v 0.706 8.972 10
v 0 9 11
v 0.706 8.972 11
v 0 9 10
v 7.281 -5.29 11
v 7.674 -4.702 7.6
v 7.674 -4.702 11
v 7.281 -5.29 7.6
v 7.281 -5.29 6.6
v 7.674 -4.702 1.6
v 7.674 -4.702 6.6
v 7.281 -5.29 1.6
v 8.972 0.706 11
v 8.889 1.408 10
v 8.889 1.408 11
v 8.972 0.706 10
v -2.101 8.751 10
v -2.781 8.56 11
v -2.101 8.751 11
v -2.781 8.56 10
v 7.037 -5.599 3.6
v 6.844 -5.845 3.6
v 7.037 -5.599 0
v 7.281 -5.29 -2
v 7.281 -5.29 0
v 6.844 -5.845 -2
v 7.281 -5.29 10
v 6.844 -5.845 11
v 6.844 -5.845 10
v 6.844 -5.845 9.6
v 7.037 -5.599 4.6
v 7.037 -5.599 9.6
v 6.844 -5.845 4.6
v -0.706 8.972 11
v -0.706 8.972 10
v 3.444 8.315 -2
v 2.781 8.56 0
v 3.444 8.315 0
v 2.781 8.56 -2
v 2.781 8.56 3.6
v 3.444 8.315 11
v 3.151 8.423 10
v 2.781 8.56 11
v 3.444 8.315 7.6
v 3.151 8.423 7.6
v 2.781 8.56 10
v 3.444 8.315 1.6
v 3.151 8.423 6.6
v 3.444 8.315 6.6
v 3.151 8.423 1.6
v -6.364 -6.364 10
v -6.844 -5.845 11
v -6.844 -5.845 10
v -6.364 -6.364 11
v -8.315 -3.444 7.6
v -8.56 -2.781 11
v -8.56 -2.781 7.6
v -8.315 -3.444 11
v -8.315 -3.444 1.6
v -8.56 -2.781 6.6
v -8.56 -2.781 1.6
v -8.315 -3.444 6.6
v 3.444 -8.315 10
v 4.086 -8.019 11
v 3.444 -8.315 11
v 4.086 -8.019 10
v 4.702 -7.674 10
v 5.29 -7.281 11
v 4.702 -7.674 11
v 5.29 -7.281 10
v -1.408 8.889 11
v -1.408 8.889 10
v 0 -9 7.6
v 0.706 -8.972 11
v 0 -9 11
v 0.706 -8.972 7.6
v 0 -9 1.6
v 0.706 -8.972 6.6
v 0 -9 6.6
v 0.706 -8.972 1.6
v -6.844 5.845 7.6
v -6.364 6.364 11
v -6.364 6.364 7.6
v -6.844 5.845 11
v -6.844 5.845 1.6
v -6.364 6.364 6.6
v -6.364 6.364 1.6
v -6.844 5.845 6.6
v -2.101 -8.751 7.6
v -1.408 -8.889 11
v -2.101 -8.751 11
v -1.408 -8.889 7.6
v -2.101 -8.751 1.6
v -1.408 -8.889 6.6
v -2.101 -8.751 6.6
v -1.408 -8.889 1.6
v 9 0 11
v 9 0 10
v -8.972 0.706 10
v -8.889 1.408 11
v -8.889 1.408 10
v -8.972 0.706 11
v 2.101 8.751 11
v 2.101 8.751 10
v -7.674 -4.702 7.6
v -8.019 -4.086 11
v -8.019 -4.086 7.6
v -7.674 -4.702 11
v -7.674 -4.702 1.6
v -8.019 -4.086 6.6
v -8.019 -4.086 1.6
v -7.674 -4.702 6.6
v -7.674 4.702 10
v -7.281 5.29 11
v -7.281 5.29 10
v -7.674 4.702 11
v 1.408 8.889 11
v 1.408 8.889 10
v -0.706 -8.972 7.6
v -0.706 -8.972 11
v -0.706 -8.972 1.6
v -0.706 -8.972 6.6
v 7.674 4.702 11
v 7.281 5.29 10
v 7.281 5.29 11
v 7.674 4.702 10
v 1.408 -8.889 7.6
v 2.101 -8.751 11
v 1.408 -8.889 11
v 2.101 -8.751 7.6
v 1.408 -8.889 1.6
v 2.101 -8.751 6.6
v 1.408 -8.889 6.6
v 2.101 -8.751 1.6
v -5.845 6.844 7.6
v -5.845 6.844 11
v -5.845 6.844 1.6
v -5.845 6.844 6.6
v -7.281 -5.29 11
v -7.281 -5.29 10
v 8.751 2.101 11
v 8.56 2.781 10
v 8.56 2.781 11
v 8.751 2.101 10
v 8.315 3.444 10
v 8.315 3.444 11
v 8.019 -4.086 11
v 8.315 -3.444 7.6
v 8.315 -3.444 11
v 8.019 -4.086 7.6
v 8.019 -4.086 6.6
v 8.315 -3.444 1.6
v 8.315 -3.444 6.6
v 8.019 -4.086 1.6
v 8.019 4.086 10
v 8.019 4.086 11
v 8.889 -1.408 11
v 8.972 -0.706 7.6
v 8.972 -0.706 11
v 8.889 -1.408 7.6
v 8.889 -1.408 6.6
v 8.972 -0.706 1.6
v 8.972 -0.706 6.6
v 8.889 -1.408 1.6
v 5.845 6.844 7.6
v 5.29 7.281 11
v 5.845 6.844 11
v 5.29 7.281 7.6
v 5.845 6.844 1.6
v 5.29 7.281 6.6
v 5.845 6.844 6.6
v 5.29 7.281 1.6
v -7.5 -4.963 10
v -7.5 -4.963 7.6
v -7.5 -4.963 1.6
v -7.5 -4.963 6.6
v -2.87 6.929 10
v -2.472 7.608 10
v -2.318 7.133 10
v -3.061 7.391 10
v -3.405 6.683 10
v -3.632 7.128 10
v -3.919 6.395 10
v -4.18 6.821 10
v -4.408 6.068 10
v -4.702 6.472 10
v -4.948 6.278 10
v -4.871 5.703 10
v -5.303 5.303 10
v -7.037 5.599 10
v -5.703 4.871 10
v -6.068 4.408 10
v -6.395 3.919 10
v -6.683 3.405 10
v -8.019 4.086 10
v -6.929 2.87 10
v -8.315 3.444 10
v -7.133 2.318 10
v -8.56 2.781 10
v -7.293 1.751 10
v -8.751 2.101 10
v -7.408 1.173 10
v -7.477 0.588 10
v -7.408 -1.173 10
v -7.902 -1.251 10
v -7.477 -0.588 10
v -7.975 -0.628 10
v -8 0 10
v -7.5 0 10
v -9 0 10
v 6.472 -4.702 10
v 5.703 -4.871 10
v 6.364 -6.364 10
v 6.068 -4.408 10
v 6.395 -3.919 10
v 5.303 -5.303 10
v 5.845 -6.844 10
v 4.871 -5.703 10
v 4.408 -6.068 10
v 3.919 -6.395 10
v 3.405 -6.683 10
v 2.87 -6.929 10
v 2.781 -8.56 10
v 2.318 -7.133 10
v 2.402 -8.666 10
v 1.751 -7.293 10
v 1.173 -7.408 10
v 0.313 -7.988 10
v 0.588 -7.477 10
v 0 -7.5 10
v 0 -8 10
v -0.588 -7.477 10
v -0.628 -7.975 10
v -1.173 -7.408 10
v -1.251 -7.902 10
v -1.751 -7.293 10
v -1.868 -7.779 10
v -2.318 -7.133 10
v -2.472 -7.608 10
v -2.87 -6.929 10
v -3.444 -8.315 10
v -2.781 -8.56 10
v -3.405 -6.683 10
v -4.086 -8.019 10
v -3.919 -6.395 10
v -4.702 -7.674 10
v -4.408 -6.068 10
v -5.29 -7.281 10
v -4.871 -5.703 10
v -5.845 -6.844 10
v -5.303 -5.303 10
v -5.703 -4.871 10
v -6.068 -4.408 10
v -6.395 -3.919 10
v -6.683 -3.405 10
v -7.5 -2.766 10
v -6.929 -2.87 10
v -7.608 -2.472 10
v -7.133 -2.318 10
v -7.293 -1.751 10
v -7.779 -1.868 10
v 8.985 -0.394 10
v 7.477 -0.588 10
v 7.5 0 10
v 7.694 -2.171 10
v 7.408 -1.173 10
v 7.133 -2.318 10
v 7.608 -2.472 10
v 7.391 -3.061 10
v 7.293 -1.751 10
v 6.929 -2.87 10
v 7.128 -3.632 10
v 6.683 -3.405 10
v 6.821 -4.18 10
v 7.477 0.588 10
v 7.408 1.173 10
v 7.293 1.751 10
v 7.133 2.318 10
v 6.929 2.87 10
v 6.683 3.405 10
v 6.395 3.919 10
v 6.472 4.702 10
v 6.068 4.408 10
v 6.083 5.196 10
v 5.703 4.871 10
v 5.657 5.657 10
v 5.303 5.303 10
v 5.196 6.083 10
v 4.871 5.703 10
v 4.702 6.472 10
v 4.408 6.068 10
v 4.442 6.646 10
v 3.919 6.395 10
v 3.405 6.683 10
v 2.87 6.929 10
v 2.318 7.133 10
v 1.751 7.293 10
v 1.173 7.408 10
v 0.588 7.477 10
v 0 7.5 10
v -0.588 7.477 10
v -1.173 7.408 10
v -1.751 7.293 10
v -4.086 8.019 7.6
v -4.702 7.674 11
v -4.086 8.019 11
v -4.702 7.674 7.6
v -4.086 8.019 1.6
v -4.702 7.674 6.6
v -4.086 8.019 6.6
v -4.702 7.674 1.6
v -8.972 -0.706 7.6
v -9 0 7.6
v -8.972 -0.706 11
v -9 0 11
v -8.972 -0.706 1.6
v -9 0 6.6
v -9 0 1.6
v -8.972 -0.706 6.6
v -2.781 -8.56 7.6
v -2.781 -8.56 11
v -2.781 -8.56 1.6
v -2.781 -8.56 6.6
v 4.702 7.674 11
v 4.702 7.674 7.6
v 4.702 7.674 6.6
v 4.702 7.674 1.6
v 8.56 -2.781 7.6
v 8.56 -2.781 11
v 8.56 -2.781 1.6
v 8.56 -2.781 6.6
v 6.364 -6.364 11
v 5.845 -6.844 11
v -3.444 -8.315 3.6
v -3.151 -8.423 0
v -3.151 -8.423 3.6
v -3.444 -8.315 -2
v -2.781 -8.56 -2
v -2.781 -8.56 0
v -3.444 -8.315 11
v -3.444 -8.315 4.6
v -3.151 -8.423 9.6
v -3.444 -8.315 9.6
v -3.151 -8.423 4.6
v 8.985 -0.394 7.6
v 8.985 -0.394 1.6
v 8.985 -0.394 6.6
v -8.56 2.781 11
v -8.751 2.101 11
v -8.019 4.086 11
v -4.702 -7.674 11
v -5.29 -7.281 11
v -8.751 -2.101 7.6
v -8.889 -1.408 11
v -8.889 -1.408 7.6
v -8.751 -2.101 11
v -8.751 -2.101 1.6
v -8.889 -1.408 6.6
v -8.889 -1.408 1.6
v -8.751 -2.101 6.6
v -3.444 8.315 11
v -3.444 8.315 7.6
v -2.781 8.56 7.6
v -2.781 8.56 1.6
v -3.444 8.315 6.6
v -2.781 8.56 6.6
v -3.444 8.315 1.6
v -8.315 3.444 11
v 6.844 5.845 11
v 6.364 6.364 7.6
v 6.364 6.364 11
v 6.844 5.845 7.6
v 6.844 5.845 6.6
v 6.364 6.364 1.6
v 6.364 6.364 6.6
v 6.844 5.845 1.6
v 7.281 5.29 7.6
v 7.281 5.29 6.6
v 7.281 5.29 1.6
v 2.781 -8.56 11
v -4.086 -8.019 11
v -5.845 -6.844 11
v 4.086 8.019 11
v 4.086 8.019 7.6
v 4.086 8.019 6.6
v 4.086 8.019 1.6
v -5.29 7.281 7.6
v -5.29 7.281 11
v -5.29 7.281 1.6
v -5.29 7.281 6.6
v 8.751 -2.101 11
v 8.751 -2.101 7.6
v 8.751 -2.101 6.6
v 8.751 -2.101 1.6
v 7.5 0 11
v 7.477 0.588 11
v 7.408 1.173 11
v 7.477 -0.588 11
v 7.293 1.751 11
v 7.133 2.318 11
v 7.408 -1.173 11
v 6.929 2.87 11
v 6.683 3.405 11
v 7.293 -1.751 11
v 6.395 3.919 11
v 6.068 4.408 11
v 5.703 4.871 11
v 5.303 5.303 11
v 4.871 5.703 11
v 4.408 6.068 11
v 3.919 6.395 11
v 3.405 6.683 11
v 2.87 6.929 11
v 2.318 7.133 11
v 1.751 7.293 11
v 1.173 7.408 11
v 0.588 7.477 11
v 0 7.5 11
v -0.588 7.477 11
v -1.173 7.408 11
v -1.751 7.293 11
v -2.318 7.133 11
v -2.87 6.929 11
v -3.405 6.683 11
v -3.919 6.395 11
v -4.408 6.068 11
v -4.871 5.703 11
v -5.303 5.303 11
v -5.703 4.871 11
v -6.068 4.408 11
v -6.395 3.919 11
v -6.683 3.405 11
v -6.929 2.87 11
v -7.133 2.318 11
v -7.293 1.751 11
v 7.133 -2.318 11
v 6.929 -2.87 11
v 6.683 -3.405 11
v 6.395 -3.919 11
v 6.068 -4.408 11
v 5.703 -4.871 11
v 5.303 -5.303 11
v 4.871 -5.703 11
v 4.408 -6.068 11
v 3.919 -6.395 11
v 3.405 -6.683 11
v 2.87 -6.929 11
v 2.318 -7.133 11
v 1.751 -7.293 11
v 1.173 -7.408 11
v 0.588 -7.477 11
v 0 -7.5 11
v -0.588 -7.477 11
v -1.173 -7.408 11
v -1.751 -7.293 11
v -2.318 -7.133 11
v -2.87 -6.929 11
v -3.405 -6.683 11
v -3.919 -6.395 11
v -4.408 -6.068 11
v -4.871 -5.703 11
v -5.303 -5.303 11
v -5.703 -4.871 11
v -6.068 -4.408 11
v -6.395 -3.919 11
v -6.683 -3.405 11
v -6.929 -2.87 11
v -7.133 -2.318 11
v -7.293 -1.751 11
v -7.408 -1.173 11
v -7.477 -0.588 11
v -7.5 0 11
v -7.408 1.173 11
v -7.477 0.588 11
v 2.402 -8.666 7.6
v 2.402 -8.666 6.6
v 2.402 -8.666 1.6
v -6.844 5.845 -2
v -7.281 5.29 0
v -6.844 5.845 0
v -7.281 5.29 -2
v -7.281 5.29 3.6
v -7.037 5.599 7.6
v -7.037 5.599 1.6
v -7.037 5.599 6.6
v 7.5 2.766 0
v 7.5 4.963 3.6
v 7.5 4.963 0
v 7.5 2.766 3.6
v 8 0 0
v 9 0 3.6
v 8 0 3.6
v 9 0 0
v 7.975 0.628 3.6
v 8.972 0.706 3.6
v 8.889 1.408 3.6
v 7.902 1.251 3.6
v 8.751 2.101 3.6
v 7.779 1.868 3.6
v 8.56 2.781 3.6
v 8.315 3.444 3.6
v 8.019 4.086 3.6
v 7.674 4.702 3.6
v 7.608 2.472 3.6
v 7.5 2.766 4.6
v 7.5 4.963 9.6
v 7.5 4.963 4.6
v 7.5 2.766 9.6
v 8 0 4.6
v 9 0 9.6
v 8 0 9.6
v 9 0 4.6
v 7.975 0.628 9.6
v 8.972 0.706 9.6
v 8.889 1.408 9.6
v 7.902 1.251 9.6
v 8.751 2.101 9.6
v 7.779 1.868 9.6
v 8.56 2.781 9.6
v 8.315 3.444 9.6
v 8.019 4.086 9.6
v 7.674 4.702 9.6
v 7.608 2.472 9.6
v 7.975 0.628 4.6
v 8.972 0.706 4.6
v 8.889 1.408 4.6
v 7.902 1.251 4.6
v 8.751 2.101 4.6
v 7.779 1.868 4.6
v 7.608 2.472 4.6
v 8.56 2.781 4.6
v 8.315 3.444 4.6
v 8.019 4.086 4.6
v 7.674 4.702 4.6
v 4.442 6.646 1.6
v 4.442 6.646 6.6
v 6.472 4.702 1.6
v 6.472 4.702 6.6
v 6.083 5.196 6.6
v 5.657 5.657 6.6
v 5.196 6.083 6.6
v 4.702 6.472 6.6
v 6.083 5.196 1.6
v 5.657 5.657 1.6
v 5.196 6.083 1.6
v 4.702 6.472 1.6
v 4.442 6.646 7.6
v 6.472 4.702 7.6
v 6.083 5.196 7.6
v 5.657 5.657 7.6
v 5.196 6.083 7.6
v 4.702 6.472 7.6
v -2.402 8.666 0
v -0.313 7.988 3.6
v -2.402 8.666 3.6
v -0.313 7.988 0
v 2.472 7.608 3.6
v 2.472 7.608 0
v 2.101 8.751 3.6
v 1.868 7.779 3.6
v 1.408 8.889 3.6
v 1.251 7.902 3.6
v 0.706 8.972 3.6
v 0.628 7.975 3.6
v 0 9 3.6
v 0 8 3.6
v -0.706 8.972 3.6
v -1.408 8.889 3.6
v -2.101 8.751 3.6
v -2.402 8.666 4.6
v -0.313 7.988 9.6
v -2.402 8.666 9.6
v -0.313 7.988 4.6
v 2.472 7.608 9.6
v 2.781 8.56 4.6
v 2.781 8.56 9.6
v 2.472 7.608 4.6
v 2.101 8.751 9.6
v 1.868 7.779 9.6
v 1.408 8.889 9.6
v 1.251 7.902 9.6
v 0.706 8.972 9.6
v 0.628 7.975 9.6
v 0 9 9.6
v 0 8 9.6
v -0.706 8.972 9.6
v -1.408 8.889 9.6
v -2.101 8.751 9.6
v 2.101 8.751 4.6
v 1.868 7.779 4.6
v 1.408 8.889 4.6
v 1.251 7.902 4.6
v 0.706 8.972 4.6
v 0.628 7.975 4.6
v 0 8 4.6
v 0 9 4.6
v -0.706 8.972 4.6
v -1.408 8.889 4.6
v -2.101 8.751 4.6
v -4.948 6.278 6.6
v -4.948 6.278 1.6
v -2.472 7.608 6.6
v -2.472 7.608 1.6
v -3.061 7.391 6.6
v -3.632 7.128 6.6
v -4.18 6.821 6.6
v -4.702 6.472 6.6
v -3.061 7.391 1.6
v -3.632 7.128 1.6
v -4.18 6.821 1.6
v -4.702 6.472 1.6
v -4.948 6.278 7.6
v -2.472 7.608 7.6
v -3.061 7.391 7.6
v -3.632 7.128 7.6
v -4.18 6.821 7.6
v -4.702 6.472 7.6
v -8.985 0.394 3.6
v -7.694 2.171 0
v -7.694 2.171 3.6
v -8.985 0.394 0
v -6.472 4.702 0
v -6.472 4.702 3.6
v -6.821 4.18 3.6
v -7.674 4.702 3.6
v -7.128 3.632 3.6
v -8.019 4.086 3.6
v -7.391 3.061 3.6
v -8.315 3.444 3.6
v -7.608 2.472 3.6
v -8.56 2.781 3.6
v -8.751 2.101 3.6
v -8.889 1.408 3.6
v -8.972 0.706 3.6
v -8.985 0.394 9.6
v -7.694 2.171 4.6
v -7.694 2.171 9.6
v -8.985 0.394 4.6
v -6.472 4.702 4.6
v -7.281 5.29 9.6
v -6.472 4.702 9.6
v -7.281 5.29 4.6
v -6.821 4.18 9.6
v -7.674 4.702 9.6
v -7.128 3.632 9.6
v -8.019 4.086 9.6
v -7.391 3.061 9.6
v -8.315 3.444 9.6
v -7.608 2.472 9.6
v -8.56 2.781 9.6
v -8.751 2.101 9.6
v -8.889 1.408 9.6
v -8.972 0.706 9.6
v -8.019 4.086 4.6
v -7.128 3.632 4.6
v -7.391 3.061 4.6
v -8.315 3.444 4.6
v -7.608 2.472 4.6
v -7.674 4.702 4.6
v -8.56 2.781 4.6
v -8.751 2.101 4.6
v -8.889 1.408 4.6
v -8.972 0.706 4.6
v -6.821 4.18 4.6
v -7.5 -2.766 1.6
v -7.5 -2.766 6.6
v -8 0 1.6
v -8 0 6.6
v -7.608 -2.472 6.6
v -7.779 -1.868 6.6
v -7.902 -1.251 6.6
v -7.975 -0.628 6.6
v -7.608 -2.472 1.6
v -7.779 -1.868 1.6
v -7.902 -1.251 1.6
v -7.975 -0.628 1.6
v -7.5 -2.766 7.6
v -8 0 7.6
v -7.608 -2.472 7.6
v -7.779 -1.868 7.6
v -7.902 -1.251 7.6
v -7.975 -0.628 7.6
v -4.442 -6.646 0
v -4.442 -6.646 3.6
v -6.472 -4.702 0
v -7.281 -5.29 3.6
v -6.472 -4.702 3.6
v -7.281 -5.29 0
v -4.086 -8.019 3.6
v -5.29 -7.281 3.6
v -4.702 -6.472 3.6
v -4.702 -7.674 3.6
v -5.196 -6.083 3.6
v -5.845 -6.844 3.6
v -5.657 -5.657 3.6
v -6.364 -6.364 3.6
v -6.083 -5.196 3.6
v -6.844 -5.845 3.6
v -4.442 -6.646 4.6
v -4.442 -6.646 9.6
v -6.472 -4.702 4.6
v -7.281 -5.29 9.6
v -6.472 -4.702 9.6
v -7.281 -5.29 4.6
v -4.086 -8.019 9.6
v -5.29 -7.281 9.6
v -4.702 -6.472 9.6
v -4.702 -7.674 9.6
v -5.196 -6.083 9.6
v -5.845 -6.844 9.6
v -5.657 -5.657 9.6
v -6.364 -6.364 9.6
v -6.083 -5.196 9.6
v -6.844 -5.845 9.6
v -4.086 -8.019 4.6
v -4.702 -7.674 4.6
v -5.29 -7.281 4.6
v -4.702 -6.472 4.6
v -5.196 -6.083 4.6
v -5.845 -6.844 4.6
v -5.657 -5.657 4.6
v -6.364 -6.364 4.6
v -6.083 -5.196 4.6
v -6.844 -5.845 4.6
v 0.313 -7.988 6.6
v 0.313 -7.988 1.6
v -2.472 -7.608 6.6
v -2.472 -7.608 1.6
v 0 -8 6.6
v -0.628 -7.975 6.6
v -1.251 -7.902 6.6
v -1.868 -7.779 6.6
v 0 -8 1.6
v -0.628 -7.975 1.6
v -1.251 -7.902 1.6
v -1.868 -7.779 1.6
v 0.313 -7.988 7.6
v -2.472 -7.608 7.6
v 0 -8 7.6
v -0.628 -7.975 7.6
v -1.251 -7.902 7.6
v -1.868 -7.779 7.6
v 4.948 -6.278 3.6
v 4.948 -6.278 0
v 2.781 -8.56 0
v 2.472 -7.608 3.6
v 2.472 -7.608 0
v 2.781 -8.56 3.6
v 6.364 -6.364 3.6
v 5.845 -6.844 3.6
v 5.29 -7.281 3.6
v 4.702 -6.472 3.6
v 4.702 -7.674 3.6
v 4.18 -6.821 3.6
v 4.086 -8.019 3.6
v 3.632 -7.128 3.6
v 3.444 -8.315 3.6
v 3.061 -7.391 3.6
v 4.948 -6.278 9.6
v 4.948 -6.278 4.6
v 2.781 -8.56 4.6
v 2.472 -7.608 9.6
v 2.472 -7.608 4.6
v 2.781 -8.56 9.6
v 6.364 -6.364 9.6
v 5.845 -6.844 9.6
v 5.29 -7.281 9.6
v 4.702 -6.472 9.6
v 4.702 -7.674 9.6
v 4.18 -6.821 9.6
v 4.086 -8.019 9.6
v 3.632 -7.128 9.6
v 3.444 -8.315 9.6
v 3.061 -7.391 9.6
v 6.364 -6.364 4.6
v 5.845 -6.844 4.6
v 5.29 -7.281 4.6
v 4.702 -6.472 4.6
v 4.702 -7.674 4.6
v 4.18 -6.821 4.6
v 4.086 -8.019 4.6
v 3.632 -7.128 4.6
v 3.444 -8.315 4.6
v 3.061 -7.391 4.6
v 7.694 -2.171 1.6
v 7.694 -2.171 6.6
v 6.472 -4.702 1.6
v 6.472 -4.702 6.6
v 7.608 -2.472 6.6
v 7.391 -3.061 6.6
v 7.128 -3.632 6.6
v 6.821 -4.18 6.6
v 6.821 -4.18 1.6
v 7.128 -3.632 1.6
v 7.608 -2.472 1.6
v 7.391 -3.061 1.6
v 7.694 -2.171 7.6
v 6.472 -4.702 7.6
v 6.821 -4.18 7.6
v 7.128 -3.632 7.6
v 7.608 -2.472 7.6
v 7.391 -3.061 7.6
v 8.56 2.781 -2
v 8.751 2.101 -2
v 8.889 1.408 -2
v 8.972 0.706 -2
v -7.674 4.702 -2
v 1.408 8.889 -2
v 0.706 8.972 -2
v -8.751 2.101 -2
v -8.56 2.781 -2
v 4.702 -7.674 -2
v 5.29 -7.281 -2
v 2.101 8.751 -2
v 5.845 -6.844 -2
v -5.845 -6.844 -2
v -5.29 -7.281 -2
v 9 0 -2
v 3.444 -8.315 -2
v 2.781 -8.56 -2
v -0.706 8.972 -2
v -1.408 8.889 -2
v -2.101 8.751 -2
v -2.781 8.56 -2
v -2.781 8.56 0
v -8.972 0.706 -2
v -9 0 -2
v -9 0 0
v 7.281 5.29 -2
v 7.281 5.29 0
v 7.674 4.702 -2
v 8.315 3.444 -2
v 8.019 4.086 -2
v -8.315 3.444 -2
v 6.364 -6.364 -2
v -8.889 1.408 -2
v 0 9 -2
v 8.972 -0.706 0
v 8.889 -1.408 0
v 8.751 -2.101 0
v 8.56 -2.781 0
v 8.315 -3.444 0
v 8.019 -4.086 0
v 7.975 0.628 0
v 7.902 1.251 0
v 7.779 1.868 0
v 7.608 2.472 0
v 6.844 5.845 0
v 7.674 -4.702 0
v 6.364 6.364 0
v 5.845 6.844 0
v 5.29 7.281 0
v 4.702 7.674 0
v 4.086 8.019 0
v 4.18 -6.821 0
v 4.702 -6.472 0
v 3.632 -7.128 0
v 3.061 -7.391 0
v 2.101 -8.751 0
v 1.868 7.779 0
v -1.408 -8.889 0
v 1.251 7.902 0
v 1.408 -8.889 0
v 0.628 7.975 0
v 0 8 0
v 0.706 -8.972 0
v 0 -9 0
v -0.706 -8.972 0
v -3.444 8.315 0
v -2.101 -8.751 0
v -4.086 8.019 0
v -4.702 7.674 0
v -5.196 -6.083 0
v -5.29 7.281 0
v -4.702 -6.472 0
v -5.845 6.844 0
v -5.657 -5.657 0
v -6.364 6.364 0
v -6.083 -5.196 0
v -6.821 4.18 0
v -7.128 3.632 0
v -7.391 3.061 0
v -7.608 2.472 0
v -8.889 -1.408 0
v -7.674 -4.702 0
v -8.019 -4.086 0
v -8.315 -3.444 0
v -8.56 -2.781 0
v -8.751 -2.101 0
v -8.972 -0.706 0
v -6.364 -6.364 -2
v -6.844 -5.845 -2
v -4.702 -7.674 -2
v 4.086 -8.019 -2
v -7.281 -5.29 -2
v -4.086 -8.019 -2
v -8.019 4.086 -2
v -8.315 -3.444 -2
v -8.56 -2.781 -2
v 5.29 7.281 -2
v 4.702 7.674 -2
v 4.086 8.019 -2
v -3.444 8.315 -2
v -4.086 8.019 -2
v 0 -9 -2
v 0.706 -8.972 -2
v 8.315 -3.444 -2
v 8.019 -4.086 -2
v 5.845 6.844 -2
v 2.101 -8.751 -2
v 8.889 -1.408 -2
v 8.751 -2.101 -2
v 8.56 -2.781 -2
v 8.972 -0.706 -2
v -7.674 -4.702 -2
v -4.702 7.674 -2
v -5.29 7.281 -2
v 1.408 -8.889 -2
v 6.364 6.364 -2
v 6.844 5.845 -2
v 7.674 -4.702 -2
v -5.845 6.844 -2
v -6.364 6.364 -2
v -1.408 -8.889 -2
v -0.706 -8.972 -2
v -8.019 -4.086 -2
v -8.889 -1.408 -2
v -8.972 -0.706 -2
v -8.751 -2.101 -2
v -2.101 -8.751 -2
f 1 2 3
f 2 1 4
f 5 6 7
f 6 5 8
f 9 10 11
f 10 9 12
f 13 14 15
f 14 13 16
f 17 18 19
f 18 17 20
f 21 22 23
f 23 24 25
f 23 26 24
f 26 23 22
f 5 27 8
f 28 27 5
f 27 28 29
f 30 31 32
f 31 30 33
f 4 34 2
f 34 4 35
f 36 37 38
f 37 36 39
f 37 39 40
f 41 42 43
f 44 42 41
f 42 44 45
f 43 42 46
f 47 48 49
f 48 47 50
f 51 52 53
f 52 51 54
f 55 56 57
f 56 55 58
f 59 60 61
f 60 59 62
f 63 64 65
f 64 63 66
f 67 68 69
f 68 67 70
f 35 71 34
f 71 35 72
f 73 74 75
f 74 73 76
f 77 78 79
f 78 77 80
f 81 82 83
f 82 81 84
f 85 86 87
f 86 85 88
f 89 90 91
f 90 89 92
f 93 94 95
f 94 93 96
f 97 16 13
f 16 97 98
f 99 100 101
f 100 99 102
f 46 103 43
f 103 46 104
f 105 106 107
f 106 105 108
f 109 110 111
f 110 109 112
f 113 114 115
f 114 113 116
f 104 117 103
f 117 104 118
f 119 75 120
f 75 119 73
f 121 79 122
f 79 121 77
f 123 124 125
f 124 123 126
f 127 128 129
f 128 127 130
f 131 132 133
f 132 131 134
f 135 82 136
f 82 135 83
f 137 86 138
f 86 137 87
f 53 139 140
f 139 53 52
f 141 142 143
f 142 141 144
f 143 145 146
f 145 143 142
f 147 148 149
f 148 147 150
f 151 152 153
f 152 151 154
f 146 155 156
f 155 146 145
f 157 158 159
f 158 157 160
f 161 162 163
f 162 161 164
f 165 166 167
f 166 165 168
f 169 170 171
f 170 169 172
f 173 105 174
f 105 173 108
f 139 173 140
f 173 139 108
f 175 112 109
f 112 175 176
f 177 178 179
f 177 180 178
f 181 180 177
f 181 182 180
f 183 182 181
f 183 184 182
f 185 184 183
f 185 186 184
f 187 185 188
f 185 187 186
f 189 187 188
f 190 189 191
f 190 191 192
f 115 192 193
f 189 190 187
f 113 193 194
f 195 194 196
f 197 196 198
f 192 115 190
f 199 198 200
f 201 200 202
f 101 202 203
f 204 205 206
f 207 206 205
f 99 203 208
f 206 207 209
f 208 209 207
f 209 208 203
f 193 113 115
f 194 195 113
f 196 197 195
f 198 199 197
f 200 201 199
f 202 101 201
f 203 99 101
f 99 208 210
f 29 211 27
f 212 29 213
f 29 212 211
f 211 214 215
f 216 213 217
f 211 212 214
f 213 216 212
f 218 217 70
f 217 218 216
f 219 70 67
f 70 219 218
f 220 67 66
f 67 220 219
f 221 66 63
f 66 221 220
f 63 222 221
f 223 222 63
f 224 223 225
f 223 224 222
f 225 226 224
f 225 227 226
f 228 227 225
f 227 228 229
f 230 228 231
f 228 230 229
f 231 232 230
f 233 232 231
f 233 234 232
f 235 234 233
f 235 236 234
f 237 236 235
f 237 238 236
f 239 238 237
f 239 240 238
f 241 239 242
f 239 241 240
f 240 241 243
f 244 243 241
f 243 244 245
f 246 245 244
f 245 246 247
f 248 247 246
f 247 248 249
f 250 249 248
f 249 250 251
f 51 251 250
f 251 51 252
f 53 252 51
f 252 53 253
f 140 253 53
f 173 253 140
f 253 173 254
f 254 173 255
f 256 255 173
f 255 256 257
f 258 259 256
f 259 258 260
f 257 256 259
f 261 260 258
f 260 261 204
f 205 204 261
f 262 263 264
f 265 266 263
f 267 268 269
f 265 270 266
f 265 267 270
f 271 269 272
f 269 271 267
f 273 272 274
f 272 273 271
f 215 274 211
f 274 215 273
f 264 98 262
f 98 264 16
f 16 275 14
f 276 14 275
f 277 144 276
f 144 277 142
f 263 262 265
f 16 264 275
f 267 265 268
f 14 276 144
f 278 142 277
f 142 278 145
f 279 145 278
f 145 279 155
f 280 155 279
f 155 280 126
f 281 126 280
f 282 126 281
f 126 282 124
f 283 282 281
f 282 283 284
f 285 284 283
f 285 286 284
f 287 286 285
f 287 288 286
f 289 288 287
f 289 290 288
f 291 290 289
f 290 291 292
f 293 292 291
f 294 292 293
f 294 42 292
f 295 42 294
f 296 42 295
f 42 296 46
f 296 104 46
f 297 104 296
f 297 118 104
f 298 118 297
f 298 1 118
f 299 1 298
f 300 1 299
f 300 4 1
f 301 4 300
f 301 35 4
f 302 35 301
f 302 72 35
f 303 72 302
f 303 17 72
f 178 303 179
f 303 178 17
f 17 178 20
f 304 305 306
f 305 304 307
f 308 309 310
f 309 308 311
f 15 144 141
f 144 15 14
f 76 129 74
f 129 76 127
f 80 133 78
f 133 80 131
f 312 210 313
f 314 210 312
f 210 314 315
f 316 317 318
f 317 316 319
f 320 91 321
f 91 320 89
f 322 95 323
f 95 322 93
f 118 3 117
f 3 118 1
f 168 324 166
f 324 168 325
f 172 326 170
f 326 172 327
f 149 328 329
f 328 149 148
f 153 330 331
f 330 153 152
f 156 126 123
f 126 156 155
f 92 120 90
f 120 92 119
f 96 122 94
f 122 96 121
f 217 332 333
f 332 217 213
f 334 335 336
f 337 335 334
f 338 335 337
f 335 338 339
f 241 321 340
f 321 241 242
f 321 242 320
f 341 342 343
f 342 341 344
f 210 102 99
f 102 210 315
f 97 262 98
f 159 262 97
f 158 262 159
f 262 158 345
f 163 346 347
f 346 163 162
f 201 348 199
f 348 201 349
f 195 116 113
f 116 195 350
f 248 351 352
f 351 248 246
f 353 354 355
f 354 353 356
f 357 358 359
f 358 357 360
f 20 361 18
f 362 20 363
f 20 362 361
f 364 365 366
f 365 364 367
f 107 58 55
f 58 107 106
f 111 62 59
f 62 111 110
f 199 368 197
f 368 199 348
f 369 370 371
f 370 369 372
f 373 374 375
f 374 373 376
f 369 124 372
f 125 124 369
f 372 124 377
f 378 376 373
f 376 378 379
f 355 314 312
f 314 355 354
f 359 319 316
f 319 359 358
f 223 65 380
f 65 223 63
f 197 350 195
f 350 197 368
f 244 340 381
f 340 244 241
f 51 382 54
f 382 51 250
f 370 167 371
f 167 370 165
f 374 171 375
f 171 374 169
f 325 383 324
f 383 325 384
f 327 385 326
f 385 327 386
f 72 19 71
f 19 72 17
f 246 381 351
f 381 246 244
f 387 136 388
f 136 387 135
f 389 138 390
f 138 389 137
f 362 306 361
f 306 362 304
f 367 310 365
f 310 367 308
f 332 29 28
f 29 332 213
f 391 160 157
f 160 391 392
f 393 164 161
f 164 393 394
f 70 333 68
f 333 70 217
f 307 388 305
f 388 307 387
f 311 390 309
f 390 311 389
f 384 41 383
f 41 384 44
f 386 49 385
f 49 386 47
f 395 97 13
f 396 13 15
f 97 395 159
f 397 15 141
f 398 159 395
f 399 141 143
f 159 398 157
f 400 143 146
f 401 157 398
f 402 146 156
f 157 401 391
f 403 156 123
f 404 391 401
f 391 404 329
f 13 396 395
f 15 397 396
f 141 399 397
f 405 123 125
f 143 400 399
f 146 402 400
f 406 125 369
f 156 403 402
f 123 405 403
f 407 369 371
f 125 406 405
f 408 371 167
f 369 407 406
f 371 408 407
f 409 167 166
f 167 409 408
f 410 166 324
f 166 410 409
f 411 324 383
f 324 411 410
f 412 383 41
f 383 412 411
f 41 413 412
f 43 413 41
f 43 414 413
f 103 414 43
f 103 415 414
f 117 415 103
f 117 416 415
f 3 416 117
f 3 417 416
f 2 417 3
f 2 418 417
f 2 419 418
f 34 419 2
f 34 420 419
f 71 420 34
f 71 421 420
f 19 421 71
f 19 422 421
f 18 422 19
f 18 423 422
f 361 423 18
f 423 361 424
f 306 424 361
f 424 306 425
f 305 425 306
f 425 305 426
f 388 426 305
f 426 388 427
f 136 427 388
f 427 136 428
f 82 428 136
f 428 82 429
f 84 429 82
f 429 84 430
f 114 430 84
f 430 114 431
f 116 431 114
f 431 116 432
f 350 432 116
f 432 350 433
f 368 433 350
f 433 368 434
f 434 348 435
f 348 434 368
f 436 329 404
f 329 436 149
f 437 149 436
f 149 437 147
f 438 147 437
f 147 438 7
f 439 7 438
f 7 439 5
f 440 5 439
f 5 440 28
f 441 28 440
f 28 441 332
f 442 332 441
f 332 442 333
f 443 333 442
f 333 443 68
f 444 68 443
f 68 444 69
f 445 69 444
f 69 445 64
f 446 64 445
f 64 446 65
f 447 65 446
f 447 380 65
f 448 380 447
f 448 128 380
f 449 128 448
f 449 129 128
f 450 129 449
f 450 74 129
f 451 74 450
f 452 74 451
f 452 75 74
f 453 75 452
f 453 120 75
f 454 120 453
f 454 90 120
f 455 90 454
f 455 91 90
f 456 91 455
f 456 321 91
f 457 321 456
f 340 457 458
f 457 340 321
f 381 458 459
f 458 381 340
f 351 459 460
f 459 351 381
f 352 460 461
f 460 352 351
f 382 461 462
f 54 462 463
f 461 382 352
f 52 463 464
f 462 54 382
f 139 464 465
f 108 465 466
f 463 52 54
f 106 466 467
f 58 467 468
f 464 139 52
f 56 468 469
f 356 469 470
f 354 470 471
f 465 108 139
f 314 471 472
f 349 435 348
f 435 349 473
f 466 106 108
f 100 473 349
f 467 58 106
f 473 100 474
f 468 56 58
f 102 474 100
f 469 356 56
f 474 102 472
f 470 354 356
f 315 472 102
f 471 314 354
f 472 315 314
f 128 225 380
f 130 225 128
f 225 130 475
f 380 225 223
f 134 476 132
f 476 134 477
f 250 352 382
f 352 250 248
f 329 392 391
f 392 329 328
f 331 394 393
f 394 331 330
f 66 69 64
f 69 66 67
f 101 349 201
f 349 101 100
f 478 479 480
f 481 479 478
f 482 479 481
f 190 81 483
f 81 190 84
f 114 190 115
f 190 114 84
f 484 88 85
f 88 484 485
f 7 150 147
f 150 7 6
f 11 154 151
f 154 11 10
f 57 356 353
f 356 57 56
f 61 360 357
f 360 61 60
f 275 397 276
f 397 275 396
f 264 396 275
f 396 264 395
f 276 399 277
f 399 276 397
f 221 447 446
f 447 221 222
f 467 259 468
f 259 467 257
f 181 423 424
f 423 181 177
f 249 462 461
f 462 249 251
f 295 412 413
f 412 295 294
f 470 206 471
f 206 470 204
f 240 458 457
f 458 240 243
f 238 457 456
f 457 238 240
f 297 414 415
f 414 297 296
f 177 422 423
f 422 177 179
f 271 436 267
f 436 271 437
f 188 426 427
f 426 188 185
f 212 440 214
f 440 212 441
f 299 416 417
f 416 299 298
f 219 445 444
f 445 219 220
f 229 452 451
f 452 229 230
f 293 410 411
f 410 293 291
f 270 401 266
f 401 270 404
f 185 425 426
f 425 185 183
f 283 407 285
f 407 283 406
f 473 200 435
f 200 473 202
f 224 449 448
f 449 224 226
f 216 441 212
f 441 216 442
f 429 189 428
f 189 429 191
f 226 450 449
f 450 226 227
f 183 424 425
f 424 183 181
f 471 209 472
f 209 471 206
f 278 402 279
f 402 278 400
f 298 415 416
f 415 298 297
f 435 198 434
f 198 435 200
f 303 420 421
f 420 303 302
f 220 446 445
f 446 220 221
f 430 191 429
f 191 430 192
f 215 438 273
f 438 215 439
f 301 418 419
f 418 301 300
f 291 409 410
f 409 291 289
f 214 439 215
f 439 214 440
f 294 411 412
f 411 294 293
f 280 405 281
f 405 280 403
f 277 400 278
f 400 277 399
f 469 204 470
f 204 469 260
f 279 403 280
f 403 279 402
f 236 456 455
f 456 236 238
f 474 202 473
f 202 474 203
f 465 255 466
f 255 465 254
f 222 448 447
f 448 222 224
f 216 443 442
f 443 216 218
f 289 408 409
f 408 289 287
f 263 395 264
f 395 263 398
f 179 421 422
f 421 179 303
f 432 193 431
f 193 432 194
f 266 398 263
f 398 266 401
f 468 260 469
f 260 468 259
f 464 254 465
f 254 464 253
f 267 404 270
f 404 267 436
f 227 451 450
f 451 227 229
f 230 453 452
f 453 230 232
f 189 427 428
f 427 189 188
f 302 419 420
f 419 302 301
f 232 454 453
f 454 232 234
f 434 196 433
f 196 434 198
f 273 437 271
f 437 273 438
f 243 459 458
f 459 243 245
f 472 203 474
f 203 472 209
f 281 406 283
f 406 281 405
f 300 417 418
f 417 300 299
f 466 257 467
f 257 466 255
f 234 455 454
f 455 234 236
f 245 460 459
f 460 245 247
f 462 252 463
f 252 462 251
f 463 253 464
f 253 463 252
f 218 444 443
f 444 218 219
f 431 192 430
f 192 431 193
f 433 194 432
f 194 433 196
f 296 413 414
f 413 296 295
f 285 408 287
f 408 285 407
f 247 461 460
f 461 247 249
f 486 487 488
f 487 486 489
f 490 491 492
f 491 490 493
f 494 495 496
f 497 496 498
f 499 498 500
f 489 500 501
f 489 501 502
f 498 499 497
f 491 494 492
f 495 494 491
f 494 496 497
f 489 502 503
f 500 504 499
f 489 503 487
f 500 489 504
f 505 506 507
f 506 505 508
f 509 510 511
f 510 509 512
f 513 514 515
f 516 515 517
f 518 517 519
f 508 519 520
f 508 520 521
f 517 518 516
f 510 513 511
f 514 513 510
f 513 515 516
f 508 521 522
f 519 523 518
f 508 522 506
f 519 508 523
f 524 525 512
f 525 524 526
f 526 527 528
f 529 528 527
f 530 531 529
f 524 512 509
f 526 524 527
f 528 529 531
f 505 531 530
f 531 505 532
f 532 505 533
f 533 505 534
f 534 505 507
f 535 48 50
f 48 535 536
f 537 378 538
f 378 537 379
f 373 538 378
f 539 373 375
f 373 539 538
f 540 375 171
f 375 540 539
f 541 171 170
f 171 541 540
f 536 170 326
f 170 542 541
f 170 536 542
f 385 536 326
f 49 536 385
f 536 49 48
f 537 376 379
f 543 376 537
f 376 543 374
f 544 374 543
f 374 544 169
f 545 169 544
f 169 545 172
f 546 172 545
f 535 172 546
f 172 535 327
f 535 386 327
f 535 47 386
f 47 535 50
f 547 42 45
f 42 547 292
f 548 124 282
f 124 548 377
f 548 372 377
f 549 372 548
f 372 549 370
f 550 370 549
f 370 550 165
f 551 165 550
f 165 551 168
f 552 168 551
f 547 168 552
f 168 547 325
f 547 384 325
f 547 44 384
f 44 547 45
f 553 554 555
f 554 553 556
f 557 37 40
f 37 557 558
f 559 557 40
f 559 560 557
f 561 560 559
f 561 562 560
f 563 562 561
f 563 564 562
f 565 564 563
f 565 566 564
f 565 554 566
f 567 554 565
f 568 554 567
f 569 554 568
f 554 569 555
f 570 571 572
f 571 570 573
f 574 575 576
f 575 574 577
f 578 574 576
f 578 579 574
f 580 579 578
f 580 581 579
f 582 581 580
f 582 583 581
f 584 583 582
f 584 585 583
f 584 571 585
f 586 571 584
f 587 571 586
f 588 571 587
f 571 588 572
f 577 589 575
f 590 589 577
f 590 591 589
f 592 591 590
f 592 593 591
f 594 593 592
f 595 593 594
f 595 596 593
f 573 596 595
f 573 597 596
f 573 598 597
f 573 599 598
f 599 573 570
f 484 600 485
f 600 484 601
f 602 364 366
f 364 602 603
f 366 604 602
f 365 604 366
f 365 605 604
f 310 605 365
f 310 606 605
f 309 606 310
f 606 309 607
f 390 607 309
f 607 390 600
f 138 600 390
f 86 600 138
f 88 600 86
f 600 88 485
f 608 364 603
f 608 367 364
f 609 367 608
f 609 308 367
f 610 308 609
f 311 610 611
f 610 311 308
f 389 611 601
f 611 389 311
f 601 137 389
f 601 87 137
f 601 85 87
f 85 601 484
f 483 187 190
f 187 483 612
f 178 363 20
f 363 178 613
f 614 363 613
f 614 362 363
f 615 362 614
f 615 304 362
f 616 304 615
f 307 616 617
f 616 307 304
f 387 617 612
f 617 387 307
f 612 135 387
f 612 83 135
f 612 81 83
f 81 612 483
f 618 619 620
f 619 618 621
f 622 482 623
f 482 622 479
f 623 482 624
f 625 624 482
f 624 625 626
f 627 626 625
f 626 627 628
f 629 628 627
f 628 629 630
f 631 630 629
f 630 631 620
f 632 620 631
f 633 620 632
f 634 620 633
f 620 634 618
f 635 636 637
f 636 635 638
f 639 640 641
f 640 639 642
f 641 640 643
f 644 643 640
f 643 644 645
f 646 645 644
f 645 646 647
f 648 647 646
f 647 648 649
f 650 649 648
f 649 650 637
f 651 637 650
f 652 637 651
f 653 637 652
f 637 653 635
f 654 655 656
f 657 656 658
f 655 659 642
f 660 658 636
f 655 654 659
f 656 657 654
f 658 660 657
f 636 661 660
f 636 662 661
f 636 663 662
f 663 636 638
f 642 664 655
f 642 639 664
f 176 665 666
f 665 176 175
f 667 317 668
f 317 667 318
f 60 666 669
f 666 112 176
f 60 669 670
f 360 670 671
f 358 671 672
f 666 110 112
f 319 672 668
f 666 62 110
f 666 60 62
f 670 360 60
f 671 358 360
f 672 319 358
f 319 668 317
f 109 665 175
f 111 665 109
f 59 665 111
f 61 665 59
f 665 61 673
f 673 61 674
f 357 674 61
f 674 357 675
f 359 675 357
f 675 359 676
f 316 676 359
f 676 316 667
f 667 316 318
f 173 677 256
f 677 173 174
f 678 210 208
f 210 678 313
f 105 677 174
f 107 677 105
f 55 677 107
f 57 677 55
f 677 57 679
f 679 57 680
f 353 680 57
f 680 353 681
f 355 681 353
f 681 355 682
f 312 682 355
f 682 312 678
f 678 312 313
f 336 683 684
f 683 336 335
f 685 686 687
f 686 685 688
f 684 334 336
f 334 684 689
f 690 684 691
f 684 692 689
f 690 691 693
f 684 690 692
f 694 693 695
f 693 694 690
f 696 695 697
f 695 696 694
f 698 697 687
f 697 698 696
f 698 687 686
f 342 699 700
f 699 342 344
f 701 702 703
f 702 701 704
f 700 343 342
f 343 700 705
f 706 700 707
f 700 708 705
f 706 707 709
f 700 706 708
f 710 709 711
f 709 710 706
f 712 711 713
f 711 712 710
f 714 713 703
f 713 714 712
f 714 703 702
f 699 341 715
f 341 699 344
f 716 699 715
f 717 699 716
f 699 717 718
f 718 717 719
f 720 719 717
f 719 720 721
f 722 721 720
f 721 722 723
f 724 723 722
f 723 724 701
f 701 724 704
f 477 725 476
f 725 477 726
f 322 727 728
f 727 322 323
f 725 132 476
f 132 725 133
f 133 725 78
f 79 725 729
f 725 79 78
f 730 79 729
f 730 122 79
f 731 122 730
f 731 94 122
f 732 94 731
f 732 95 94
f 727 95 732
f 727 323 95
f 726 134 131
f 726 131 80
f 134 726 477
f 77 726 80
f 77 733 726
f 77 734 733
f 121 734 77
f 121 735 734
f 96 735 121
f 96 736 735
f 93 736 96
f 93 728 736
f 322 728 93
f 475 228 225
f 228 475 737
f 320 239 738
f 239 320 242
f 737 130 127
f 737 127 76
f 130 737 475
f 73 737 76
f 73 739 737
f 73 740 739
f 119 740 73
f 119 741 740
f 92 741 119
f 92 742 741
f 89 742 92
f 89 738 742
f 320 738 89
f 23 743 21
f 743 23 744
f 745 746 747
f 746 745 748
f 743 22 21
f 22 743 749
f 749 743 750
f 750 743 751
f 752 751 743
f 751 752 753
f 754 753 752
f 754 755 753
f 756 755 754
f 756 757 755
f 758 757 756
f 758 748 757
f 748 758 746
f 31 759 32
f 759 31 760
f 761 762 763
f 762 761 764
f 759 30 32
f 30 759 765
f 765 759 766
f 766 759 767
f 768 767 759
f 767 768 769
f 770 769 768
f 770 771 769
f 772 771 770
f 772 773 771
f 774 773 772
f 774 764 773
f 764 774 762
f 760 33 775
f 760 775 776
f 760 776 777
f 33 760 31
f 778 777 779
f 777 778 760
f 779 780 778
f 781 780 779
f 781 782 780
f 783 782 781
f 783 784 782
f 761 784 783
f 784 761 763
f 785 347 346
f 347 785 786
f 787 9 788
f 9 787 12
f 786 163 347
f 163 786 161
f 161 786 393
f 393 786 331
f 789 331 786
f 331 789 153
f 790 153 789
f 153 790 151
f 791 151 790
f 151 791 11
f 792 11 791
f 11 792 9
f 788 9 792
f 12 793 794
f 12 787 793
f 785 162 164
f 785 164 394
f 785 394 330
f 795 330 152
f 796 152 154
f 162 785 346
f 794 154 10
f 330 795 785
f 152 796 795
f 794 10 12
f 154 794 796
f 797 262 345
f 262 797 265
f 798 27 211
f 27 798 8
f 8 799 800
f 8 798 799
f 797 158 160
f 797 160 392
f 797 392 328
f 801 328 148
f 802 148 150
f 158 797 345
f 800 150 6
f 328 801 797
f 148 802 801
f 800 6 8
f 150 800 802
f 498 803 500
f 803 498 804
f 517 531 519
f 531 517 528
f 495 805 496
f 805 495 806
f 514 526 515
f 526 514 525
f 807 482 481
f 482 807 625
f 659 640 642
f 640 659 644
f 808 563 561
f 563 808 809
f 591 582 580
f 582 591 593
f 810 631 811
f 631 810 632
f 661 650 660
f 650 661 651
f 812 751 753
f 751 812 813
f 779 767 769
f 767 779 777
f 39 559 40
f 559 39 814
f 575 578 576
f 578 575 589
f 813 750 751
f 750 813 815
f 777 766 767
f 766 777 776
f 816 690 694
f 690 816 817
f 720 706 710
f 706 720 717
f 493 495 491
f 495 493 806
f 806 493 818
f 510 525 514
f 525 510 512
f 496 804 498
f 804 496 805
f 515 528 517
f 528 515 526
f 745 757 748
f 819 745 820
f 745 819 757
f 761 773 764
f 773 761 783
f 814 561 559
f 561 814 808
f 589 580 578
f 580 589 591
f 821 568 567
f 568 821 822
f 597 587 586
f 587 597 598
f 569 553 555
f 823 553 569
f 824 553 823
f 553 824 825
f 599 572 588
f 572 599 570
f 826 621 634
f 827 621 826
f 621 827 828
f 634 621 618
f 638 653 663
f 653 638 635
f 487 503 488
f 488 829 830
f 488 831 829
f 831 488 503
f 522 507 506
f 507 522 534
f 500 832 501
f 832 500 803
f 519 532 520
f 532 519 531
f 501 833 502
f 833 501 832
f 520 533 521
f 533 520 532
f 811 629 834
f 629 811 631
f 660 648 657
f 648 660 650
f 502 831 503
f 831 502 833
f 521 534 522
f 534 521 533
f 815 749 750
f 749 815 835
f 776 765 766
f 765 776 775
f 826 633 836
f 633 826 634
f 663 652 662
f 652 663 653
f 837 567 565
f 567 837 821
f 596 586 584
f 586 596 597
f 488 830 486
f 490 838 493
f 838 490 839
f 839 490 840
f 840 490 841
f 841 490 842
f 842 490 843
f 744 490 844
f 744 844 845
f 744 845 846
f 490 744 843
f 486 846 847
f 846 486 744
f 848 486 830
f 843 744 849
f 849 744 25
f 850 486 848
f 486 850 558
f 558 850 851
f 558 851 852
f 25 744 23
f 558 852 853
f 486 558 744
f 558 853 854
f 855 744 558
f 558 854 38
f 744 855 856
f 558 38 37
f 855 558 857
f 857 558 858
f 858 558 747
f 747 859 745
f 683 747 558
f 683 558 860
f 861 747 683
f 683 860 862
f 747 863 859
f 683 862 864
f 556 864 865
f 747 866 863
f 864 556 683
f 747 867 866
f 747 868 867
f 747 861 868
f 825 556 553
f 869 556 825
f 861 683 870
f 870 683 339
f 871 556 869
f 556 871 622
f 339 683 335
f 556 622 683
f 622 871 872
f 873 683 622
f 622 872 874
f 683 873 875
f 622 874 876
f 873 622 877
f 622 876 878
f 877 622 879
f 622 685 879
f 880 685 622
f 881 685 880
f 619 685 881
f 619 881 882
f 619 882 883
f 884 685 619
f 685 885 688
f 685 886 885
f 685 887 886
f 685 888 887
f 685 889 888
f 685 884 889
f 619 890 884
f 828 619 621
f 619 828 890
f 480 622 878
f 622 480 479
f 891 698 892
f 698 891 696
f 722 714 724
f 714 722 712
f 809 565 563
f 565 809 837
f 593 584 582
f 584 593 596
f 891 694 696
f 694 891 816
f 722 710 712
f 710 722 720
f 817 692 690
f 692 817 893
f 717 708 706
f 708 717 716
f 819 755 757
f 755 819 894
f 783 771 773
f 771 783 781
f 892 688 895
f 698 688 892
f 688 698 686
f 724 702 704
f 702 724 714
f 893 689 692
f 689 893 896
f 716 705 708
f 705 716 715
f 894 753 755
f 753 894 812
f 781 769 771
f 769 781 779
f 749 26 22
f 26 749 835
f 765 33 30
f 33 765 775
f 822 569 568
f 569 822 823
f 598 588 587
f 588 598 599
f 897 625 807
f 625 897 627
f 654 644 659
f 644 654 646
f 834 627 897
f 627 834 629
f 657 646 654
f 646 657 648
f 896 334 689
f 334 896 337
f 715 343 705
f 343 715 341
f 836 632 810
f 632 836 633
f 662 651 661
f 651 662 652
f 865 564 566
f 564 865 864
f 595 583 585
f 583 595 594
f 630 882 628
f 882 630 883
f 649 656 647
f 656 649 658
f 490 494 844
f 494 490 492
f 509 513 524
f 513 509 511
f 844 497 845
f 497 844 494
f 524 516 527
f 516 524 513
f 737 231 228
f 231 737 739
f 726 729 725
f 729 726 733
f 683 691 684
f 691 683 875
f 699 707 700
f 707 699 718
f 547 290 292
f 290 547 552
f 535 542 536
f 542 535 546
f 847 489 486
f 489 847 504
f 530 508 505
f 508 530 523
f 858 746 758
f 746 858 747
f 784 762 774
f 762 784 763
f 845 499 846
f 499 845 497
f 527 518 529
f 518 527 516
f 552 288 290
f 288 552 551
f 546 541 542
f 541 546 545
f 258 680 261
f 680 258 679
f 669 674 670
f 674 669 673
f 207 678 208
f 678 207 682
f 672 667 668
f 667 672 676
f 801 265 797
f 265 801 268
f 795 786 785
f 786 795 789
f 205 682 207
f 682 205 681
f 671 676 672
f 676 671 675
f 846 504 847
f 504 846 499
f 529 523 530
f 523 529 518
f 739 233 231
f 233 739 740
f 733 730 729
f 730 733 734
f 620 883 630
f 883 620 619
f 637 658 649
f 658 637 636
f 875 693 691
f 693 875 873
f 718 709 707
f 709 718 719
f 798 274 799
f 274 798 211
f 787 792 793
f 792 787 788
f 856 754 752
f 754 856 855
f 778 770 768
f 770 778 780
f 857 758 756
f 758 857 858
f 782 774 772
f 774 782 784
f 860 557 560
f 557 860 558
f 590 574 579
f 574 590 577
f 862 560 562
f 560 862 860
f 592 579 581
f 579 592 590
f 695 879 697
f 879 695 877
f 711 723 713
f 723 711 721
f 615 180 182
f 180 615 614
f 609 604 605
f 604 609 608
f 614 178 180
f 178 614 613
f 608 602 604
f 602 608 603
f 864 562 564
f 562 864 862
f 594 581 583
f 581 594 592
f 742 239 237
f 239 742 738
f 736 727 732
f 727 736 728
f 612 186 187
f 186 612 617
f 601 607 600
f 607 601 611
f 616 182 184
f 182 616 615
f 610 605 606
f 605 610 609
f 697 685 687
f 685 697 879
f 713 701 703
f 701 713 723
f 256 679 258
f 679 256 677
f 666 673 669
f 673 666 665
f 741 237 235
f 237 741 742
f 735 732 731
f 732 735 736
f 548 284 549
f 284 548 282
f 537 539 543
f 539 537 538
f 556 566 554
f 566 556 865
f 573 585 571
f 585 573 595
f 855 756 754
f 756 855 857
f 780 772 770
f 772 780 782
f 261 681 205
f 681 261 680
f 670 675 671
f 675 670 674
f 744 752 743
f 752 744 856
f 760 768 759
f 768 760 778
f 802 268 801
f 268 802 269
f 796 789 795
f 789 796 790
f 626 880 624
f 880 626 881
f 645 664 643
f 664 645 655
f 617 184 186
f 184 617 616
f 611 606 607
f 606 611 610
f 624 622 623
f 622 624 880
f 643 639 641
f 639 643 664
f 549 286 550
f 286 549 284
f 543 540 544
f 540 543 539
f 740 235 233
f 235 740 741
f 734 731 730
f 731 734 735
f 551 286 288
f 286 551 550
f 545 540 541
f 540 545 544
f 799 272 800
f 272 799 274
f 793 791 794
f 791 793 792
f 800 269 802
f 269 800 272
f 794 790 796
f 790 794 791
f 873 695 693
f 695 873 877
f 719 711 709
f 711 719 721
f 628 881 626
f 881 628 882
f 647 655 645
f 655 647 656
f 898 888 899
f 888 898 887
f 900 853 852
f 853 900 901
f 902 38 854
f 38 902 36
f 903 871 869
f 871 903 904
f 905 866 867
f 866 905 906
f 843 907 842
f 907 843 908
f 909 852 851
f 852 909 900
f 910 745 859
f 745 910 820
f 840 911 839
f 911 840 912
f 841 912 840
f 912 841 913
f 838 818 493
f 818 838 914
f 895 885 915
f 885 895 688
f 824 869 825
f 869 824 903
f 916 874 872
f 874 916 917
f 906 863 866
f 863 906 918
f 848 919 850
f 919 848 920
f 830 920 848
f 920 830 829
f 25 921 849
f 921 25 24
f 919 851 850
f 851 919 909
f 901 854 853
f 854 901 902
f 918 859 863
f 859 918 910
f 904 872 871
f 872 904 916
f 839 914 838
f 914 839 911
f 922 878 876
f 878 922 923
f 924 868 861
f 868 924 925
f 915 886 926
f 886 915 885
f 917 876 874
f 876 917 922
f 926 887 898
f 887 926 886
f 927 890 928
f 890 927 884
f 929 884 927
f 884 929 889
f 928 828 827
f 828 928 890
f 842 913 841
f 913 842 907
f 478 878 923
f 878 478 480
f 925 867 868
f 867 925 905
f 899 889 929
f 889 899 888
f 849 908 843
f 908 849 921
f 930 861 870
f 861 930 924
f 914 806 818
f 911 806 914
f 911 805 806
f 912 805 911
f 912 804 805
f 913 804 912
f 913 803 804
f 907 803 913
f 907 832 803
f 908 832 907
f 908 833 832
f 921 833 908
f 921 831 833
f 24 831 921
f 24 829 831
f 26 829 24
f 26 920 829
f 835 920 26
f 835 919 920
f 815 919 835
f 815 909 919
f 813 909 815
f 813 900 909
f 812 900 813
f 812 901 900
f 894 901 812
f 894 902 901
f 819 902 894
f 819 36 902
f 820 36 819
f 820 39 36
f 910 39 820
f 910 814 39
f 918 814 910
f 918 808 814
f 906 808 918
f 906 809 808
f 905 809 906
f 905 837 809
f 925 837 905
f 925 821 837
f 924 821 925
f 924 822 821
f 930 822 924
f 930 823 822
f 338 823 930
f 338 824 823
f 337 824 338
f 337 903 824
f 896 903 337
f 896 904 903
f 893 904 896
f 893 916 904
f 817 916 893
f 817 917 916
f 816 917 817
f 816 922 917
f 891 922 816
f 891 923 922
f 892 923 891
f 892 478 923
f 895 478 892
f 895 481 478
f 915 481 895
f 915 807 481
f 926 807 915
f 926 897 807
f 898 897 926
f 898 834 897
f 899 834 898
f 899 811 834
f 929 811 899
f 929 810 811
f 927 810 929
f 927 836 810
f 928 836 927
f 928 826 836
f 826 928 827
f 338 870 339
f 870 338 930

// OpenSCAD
$fn=80;
th=10;
w=15;
h=3;
tol=0;

module star()
{
cube([20,5,10]);
}

/*
star();
translate([5,3,0])
star();

translate([10,0,0])
star();

translate([5,-3,0])
star();
*/
module test()
{
translate([0,0,-4.4])
rotate([90,0,0])
union()
{
for(i=[1:h])
{

  translate([0,(6-tol)*i,0])
  star();

}
}
}


//heela
module hela()
{
union()
{
for(i=[0:10])
{
  translate([cos(i*9*4)*5*3/2,sin(i*9*4)*5*3/2,0])
  rotate(i*360/(10)+90)

  if(i%2==0){
  translate([0,0,-3])
  test();
  }
  else{
  test();
  }
}
}
}


module top()
{
translate([0,0,10])
difference()
{
cylinder(r=9,h=1);
translate([0,0,-.2])
cylinder(r=7.5,h=4);
}

}

module bottom()
{
translate([0,0,-2])
cylinder(r=9,h=2);

}
bottom();
top();

intersection()
{
hela();
difference()
{
cylinder(r=9,h=10);
cylinder(r=8,h=10);
}
}
